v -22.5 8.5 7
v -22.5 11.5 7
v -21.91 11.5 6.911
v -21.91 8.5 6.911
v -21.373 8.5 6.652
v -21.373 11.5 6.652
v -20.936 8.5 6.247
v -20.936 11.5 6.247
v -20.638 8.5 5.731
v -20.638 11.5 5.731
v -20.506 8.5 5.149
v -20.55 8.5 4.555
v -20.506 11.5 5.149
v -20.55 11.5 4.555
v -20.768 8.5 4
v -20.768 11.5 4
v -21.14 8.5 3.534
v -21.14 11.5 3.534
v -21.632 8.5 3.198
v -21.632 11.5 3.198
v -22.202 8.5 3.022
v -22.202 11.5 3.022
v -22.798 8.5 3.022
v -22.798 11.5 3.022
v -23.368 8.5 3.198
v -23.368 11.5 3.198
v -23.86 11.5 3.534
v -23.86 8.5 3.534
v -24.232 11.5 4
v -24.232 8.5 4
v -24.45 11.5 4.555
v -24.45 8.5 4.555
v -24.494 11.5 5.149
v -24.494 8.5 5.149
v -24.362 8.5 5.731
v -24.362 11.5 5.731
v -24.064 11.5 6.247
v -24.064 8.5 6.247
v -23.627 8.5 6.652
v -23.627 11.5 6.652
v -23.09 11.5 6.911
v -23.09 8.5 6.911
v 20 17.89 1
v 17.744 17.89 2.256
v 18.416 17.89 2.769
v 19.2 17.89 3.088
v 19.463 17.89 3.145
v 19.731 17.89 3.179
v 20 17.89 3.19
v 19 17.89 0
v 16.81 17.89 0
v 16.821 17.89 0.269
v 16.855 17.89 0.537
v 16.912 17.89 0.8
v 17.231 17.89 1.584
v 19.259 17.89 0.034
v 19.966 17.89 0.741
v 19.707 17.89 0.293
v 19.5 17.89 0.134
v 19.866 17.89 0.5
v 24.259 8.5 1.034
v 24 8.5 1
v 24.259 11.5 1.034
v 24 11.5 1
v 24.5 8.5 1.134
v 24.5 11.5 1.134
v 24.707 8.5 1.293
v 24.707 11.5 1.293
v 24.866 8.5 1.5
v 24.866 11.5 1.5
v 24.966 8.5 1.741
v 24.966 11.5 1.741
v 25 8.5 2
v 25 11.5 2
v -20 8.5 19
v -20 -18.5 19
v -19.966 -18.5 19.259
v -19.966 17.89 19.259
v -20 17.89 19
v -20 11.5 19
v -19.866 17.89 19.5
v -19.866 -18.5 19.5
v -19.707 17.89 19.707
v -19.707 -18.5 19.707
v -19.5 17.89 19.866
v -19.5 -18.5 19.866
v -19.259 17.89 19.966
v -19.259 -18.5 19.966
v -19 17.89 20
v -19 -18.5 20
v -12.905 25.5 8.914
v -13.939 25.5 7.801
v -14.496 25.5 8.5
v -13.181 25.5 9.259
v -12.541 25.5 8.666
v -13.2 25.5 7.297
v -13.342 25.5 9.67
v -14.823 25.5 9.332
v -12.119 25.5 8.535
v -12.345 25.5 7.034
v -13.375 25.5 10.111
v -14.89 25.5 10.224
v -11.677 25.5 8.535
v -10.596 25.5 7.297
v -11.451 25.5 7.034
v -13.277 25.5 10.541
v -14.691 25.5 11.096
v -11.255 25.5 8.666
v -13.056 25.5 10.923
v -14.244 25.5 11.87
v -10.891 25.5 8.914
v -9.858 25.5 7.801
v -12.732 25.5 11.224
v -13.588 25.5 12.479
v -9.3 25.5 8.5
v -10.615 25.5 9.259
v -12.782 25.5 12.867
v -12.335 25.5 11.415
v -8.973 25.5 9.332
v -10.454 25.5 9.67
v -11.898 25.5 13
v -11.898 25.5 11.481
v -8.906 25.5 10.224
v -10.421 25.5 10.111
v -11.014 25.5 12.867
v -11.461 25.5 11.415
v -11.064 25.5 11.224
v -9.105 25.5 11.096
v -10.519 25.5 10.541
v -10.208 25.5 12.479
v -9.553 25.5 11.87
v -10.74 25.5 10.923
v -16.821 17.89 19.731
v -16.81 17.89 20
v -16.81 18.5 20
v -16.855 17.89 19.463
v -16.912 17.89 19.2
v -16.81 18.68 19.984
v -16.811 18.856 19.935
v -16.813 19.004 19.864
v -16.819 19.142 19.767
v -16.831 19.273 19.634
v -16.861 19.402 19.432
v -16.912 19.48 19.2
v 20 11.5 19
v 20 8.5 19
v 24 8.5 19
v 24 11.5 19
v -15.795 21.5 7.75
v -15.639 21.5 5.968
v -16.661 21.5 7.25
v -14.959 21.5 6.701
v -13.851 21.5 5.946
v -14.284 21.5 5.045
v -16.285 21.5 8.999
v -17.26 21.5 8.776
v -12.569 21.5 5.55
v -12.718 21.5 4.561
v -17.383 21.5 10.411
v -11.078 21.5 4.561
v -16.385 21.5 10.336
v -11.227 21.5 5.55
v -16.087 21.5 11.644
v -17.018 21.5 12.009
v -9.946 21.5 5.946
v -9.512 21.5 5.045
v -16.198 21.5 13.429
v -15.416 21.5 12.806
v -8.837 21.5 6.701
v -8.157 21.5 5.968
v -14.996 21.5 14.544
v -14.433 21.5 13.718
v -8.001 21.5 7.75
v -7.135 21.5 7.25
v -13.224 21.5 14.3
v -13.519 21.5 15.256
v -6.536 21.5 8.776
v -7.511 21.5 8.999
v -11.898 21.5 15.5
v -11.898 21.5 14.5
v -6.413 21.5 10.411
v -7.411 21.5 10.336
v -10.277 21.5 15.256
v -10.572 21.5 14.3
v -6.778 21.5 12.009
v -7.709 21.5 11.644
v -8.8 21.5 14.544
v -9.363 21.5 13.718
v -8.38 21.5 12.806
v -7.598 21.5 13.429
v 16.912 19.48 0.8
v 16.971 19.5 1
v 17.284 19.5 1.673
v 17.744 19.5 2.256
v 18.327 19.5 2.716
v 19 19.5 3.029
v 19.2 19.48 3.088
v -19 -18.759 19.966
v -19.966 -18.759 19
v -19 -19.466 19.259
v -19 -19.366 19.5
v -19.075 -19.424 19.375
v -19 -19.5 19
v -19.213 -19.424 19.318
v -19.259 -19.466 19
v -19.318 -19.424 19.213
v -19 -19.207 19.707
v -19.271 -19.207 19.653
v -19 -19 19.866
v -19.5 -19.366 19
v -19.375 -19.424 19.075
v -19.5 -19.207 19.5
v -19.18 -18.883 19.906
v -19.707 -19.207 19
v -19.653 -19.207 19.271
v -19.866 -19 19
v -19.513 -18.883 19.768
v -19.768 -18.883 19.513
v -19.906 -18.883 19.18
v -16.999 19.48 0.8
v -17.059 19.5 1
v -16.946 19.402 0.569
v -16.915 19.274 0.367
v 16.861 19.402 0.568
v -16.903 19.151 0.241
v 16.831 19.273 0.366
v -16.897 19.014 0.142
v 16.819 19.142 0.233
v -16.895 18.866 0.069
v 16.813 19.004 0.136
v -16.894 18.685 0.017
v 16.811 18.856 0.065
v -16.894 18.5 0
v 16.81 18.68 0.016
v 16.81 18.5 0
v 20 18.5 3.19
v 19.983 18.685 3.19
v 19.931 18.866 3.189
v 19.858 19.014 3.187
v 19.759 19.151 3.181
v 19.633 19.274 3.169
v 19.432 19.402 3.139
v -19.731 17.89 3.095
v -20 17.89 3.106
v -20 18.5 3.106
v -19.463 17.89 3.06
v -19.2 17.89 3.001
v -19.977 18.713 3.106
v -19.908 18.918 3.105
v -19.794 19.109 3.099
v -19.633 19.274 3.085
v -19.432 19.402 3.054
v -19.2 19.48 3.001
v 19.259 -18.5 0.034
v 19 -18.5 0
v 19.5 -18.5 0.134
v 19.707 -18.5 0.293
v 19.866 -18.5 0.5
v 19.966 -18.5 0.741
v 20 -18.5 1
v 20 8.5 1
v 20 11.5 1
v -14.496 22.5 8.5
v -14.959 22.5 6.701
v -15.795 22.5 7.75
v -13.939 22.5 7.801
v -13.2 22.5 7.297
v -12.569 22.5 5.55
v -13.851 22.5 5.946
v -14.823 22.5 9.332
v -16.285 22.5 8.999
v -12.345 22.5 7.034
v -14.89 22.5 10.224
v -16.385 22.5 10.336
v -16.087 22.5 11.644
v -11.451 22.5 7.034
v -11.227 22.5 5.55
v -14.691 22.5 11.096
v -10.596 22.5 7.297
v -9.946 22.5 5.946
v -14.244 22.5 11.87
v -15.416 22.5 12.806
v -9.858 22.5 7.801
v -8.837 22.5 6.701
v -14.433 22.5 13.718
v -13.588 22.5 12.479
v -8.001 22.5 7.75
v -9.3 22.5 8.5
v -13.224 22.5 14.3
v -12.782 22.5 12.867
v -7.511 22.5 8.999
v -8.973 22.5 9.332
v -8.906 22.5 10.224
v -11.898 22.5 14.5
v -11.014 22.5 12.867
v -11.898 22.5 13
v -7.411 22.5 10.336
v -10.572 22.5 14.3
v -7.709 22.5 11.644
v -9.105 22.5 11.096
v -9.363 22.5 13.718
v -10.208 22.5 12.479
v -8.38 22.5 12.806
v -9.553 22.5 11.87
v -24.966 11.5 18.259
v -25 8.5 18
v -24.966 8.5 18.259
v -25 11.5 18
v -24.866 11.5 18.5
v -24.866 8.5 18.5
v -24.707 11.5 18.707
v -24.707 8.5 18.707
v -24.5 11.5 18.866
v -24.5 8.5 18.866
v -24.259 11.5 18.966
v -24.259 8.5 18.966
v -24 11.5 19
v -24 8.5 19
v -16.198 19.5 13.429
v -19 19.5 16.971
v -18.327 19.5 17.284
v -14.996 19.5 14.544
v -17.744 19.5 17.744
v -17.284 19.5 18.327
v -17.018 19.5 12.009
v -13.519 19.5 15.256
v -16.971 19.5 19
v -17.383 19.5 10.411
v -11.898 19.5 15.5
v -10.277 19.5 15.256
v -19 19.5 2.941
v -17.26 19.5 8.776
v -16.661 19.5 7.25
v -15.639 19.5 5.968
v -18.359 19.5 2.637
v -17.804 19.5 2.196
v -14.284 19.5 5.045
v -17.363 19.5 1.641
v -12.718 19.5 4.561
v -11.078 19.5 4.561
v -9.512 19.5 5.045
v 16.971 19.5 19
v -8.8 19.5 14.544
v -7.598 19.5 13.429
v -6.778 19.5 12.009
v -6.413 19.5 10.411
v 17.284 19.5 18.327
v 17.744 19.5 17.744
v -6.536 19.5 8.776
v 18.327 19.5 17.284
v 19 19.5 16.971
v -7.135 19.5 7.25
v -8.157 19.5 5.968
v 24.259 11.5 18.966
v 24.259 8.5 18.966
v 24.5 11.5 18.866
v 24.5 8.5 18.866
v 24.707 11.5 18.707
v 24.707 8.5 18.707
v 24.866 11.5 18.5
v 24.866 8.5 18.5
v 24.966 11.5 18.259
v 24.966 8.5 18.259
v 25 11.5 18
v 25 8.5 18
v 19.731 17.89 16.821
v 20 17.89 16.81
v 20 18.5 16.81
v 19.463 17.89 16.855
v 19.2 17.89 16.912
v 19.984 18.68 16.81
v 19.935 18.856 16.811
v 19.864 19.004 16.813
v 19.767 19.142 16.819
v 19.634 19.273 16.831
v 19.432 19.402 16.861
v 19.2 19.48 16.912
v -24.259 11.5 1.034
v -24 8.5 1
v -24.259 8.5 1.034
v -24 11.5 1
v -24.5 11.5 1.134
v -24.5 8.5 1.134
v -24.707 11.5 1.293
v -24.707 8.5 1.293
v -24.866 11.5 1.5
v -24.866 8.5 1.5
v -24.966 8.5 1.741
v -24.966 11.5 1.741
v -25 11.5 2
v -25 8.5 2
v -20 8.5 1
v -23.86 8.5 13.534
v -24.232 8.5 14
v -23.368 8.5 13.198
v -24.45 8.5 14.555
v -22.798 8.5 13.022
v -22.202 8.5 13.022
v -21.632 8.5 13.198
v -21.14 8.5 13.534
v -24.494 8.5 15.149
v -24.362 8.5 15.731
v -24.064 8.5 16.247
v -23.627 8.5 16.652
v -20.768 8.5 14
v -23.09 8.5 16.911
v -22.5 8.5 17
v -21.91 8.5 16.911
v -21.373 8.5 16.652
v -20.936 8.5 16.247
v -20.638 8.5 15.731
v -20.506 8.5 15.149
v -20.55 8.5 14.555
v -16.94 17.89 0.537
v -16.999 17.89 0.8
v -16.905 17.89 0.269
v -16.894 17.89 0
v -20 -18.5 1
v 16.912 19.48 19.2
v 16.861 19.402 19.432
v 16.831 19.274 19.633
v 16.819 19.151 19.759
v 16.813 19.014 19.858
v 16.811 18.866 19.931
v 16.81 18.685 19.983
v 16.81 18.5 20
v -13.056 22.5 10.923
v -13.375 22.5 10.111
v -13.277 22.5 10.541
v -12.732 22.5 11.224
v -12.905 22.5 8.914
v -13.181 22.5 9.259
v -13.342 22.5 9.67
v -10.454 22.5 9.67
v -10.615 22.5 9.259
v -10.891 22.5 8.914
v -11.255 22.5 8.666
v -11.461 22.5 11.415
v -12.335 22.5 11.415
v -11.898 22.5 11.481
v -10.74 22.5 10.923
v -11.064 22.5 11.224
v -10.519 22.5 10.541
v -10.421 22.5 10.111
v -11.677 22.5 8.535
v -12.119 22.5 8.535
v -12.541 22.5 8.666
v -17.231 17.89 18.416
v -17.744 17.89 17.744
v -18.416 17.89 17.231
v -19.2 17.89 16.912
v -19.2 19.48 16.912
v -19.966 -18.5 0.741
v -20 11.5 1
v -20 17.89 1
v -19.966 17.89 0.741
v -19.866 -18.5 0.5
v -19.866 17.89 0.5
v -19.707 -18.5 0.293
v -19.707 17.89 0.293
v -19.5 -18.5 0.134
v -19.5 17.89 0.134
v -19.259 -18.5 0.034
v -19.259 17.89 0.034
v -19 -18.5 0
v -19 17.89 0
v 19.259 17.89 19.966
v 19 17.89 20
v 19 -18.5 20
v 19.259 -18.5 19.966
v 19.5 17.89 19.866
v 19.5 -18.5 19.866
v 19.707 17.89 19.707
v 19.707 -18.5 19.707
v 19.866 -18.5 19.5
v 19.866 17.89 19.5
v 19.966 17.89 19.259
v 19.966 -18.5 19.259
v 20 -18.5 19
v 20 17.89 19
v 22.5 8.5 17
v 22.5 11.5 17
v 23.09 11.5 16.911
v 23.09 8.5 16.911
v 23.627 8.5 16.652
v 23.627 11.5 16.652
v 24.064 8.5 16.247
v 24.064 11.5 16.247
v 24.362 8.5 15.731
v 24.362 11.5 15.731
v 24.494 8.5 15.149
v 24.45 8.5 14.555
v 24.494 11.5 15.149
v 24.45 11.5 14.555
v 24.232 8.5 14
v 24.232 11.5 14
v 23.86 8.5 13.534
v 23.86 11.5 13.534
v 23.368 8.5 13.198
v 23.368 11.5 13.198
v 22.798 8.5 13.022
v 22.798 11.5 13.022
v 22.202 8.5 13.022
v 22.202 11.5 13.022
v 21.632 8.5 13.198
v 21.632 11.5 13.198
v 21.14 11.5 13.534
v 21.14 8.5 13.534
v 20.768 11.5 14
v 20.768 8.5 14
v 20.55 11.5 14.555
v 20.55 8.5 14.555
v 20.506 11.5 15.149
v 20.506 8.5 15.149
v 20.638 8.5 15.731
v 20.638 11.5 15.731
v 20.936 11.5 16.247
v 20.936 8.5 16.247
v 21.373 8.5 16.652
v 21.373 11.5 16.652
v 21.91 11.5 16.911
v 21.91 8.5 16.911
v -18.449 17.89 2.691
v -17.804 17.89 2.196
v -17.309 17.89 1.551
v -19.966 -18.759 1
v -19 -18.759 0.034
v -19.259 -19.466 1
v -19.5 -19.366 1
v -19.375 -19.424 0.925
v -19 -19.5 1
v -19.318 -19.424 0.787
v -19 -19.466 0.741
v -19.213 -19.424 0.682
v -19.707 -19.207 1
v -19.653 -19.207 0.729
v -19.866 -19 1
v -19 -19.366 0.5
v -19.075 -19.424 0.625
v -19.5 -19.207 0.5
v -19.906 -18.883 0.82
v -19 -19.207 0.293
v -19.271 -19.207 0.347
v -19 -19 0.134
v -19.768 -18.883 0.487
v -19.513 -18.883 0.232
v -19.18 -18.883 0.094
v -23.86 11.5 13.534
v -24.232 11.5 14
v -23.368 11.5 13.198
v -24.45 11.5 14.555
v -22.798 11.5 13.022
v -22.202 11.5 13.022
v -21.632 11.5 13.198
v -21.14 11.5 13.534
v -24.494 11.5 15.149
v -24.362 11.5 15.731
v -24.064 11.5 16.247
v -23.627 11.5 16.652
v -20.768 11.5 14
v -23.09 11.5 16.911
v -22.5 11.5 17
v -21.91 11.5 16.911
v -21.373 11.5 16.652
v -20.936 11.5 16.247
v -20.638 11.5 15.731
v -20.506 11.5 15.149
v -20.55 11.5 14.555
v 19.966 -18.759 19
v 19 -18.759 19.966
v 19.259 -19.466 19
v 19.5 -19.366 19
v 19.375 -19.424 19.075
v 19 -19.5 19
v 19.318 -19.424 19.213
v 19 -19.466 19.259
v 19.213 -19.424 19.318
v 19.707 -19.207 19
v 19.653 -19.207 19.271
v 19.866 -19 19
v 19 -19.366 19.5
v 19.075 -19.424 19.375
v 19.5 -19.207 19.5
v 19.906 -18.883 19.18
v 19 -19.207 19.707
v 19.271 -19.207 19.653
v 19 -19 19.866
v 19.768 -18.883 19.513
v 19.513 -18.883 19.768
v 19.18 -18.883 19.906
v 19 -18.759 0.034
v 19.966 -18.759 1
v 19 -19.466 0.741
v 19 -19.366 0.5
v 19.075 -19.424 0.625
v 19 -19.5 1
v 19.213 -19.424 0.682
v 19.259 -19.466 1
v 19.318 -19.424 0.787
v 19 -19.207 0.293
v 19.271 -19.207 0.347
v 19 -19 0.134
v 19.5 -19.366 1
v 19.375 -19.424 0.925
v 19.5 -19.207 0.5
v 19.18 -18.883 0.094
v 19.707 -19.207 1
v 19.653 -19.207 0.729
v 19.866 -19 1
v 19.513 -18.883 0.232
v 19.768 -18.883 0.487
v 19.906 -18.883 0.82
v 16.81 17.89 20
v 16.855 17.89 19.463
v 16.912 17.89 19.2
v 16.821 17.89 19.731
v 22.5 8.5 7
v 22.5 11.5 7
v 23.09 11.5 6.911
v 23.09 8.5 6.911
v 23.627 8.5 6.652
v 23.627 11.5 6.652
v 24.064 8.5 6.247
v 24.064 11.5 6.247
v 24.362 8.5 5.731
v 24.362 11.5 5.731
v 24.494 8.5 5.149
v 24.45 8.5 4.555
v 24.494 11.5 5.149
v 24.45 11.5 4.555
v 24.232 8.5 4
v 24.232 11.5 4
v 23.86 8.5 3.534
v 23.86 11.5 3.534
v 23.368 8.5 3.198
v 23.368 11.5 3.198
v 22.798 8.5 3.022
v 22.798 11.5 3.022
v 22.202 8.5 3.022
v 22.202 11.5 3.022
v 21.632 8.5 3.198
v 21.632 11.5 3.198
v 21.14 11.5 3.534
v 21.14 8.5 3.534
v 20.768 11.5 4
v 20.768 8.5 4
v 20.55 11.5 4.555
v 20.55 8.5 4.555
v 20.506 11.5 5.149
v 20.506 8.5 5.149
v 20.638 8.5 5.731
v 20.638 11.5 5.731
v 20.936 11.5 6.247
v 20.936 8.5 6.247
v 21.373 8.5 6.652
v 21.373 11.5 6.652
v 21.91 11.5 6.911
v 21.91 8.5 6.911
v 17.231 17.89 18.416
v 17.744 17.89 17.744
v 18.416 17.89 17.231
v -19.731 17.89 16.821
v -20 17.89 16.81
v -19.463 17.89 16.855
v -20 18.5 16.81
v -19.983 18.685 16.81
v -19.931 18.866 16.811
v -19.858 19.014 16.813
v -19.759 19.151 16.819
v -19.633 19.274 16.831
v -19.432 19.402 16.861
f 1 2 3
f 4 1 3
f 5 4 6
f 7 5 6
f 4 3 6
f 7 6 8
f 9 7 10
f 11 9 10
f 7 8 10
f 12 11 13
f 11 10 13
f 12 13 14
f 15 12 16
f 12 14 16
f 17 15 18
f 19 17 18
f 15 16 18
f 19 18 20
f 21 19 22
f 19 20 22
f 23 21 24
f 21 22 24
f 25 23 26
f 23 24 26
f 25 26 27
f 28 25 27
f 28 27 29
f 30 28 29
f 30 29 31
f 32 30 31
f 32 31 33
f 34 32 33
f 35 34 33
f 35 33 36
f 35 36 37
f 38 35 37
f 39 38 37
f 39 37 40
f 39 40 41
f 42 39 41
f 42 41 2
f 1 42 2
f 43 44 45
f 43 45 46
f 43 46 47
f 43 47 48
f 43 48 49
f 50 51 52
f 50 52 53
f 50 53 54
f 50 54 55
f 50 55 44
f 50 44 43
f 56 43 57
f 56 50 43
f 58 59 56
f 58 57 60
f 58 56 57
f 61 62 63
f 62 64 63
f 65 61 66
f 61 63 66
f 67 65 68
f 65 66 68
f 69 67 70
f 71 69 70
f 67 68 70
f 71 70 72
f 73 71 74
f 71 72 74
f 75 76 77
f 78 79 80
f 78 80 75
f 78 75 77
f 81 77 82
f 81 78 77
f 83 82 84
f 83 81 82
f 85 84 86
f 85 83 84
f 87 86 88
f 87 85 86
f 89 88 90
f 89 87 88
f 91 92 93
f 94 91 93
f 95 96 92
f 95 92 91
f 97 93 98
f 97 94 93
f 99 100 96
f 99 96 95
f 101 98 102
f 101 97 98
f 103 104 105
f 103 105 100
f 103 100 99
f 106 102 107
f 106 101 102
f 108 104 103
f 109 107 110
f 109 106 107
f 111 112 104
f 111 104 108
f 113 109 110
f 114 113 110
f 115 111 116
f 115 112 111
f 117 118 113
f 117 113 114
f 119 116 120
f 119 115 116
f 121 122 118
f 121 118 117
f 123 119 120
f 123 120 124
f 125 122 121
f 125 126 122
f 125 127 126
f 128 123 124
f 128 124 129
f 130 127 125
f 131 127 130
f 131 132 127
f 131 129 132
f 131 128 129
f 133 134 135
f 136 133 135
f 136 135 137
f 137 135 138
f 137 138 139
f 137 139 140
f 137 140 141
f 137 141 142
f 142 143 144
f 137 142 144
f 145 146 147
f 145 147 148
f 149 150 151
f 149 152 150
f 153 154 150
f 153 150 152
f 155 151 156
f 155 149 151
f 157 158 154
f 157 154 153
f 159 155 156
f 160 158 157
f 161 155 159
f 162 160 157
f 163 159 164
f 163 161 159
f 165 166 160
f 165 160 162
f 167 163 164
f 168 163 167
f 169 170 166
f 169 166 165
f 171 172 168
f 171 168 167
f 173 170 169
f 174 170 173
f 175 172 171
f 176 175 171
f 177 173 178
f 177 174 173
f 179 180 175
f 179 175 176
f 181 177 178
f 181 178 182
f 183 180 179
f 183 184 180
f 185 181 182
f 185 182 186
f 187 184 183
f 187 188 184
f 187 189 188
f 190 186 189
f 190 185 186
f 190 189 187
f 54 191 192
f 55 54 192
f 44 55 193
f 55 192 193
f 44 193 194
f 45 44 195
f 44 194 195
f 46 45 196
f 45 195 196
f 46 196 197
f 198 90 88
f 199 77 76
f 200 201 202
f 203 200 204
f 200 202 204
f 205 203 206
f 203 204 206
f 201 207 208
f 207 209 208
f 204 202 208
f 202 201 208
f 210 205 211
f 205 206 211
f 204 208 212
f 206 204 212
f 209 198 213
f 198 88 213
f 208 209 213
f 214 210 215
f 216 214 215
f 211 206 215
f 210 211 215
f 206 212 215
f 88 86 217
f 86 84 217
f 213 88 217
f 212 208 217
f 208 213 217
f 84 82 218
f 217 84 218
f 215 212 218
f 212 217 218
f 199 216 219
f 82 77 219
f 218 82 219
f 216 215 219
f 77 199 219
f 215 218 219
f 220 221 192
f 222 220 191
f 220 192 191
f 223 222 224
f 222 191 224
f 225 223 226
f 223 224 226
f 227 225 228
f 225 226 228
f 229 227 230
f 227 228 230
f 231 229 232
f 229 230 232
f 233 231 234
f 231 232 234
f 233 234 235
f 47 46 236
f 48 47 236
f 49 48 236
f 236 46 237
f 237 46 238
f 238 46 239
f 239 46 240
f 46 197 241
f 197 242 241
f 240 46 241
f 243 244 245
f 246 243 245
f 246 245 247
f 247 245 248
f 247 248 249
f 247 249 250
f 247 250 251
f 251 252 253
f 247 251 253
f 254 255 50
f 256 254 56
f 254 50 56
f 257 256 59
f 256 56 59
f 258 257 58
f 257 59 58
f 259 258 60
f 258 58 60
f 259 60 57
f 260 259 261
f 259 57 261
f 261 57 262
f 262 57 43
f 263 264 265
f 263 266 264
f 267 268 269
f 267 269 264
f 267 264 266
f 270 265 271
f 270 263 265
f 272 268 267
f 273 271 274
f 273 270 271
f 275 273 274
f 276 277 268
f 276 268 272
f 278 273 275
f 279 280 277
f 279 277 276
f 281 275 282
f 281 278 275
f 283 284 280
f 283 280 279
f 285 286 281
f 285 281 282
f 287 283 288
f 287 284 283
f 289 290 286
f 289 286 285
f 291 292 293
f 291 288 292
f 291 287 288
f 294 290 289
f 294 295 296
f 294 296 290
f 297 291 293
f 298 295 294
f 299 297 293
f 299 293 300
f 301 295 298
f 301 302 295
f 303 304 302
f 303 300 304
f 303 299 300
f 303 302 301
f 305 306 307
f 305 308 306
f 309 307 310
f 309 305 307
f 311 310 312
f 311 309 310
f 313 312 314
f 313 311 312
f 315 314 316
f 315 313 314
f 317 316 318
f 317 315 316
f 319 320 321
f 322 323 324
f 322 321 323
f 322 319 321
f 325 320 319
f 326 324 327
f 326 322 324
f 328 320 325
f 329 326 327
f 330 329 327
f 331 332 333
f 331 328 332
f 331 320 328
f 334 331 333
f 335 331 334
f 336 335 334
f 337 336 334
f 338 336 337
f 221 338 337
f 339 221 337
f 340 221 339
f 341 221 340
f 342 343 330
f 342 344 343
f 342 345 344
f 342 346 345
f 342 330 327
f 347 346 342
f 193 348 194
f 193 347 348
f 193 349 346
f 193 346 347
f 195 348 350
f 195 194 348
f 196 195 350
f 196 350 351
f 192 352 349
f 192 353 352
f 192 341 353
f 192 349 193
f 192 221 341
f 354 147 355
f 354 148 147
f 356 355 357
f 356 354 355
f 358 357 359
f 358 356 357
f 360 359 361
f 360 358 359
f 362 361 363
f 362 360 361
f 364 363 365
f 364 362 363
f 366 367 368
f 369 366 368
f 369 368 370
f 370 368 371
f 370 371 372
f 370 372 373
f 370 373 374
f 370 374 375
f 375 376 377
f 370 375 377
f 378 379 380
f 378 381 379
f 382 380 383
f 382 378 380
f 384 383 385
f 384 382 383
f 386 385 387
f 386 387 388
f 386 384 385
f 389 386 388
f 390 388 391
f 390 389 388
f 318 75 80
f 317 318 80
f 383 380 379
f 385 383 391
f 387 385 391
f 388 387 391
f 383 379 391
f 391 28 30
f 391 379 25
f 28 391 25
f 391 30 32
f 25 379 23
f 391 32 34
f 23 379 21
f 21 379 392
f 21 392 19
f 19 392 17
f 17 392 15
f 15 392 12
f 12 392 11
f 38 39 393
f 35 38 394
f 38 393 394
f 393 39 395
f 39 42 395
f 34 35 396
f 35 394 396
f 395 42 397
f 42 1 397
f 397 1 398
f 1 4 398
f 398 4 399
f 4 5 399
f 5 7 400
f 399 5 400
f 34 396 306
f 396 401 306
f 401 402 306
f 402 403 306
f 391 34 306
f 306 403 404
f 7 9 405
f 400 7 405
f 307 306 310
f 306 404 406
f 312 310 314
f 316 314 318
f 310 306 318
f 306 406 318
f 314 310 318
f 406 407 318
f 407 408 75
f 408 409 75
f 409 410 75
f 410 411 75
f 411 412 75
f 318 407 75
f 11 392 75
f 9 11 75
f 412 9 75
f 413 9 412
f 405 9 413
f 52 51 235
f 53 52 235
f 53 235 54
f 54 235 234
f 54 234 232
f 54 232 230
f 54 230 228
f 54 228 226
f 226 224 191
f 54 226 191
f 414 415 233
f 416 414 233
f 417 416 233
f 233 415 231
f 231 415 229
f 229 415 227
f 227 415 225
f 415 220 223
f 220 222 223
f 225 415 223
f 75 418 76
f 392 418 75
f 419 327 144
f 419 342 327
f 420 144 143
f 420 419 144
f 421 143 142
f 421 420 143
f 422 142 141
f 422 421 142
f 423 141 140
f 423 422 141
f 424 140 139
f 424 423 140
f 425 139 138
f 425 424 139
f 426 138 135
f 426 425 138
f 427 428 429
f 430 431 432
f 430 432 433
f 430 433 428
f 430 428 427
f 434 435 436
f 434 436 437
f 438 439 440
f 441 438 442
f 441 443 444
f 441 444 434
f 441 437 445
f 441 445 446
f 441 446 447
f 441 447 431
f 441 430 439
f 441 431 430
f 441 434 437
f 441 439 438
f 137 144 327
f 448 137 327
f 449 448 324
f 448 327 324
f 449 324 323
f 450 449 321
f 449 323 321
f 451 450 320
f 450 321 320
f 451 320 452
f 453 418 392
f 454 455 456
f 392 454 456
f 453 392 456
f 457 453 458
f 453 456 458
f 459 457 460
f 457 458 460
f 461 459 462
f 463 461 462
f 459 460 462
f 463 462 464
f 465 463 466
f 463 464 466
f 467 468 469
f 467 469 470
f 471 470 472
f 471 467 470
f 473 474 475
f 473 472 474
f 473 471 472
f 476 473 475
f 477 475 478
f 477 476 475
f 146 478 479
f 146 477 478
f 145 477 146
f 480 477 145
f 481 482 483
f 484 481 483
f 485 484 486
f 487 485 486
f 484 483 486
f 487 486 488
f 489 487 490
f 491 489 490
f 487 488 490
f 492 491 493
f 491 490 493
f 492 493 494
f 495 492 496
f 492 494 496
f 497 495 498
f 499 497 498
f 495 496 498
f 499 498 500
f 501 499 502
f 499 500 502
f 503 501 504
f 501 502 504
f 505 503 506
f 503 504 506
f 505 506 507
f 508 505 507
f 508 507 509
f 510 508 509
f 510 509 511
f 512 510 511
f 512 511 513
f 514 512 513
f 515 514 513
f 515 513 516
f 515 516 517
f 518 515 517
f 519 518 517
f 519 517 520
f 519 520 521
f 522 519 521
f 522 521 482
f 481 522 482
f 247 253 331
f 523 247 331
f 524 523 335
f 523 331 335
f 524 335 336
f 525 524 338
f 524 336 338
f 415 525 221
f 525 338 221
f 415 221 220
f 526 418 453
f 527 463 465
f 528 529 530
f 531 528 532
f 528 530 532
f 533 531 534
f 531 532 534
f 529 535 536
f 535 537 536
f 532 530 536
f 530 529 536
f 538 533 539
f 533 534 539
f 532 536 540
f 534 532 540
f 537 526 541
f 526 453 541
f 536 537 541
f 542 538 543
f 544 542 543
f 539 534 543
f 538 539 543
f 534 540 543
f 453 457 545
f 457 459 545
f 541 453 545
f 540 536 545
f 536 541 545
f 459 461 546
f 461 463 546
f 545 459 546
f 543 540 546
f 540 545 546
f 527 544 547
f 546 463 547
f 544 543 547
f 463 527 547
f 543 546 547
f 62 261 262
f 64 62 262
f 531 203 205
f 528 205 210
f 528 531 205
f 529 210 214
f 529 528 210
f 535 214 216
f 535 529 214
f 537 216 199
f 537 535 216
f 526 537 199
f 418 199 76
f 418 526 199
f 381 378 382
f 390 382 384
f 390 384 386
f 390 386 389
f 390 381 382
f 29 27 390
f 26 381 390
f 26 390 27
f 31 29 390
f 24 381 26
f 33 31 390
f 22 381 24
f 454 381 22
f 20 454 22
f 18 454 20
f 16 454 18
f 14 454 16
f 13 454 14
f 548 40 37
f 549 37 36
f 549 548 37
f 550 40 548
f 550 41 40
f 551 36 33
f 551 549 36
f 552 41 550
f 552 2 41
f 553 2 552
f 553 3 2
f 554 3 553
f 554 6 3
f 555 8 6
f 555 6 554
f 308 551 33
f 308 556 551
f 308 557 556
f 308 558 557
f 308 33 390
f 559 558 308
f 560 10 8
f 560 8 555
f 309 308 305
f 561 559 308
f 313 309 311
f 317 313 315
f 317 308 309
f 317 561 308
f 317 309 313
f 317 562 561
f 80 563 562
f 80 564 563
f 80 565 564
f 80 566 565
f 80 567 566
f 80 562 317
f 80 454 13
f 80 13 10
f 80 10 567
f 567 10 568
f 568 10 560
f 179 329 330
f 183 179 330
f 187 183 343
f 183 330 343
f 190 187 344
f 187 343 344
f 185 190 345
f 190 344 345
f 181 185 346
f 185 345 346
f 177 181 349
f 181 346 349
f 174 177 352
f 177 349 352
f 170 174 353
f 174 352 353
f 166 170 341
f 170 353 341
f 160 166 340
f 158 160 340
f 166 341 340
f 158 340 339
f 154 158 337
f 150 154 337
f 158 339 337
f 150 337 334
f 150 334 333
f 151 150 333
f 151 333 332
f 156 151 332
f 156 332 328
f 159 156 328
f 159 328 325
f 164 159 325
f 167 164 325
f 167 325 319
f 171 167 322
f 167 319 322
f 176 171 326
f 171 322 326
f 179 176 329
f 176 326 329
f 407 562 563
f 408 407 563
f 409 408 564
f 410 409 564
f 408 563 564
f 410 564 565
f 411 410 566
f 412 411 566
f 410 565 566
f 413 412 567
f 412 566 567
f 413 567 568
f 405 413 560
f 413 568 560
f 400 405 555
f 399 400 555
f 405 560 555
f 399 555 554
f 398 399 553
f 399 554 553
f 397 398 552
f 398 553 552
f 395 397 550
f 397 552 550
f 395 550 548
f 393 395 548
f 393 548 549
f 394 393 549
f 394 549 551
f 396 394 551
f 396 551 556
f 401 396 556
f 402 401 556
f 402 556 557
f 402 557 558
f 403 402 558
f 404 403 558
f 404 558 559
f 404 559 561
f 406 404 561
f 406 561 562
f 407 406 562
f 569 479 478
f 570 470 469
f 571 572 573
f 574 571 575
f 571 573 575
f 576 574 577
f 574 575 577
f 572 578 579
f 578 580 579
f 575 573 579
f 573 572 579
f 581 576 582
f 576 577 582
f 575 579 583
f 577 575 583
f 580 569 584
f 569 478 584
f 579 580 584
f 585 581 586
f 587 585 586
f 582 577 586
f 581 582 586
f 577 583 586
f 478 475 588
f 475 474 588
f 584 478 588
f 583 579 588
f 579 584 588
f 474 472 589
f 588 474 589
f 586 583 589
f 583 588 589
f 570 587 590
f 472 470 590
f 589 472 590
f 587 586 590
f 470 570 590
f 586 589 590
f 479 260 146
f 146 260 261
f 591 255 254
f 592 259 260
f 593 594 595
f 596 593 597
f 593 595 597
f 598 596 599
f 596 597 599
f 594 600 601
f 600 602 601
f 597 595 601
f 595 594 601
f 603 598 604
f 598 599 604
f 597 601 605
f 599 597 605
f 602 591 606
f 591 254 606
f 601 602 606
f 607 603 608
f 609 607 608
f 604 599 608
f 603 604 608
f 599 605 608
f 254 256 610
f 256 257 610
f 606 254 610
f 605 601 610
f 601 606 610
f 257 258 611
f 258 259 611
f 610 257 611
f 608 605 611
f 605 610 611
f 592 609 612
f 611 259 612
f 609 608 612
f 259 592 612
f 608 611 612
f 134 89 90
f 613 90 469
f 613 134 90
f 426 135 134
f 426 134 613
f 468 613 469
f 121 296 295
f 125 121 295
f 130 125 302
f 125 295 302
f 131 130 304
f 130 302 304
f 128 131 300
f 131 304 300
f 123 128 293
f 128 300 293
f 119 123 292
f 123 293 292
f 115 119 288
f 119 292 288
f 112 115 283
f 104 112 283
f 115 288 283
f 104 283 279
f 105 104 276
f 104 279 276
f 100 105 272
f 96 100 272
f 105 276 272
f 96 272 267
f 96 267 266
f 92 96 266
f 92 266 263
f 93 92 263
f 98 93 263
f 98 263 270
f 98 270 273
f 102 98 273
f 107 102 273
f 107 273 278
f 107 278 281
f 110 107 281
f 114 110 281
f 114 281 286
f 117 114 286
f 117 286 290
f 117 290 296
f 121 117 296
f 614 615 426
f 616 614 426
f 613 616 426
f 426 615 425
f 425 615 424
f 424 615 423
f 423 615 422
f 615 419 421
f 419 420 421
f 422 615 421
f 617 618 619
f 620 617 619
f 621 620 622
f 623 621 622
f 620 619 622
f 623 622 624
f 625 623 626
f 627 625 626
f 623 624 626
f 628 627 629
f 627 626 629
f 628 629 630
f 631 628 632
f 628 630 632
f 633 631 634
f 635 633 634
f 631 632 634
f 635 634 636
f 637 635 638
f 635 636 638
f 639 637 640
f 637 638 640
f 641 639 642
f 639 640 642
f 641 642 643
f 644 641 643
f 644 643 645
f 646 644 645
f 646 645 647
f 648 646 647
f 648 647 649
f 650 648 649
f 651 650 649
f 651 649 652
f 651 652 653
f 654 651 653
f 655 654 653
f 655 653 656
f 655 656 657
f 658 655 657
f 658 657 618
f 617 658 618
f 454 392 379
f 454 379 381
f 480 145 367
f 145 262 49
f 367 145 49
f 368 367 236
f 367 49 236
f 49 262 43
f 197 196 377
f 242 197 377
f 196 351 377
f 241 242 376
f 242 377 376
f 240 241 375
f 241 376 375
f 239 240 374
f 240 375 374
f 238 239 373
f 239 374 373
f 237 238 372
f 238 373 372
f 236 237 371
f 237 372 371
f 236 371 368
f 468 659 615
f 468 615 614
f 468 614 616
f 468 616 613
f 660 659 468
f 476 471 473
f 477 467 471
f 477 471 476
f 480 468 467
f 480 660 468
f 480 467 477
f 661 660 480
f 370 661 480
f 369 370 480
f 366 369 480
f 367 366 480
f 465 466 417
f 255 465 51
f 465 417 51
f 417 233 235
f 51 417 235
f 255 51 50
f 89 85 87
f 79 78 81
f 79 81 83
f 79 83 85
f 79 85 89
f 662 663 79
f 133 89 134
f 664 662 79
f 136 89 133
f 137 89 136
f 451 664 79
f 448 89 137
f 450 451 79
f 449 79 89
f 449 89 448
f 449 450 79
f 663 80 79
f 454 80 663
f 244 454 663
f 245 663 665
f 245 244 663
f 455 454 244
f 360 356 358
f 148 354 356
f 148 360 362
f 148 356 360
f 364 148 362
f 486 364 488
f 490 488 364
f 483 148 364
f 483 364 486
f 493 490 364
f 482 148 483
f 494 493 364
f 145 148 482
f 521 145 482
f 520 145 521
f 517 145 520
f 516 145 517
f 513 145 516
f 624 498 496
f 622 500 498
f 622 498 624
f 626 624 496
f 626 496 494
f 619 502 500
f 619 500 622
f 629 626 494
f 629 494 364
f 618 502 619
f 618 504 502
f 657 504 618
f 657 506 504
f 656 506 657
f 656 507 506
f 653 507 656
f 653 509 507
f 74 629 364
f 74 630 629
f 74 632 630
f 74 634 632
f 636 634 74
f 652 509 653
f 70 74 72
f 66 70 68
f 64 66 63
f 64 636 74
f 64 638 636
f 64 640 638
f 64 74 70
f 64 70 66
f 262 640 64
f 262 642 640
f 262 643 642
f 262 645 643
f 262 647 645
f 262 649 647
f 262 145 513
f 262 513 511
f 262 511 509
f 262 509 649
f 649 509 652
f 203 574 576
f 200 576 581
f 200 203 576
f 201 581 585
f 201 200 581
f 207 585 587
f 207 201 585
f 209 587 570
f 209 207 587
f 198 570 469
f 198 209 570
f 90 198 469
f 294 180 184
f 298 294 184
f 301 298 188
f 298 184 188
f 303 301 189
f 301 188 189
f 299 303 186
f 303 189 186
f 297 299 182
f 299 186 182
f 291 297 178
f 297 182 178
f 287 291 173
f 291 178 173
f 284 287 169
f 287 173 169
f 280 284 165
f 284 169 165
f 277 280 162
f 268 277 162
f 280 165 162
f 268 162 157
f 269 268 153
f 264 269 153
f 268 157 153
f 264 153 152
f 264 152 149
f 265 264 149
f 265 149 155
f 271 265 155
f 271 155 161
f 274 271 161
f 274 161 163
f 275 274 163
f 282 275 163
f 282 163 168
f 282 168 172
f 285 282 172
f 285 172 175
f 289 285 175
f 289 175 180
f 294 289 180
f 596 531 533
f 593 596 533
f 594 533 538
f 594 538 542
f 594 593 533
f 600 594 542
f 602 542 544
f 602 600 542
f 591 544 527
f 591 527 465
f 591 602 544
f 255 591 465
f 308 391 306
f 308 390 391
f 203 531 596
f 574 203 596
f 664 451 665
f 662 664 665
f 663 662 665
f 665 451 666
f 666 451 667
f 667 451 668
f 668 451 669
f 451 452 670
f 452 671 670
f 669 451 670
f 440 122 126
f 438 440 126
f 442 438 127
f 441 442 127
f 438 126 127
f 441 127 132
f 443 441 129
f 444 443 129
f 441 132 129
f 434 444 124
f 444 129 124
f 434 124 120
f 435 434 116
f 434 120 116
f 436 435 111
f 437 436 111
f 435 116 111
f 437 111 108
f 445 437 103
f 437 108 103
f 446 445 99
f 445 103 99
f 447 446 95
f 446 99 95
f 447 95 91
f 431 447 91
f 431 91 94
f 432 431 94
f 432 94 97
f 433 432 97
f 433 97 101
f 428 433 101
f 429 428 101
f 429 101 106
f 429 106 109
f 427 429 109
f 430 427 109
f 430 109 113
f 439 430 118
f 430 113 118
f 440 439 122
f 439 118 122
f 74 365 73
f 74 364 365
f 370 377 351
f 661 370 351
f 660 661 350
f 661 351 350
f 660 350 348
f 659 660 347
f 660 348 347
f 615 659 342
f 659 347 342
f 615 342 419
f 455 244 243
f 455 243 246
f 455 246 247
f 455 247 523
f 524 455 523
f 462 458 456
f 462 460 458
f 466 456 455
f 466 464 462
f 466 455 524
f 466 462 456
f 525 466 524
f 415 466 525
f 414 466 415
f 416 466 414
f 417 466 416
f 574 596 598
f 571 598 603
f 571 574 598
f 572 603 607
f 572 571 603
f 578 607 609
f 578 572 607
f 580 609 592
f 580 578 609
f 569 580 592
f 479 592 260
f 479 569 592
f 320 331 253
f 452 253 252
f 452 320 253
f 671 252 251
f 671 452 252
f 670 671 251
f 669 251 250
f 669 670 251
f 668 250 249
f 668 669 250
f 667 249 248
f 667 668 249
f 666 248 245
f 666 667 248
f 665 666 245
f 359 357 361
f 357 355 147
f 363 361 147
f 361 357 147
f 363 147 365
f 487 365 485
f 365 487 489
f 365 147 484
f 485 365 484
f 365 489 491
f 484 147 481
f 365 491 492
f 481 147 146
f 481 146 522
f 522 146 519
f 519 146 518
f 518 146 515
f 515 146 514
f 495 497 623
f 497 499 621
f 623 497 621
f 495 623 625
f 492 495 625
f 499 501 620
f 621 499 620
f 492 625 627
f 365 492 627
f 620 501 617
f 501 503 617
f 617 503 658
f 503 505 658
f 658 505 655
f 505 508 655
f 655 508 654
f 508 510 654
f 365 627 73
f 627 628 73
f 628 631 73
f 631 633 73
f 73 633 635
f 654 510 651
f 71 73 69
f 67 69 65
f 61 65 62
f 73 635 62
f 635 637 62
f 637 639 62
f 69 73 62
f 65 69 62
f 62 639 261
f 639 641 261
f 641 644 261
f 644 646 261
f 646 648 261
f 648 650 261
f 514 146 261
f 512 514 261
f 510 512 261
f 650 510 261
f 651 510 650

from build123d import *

# Parameters (mm, degrees)
SKETCH_1_W           = 40
SKETCH_1_H           = 39
EXTRUDE_1_DEPTH      = 20
SKETCH_2_R           = 3
EXTRUDE_2_DEPTH      = 6
SKETCH_2_5_R         = 5.5
SKETCH_2_5_R_2       = 4.5
EXTRUDE_5_DEPTH      = 2
SKETCH_2_6_R         = 4.5
SKETCH_2_6_R_2       = 3
EXTRUDE_6_DEPTH      = 3
CUT_EXTRUDE_5_DEPTH  = 1.61
CUT_EXTRUDE_6_DEPTH  = 1.61
FILLET_2_R           = 1
FILLET_3_R           = 1
FILLET_5_R           = 1
FILLET_6_R           = 1
FILLET_9_R           = 1
SKETCH_6_R           = 1.481108103
CUT_EXTRUDE_11_DEPTH = 3
SKETCH_7_W           = 18
SKETCH_7_H           = 3
EXTRUDE_10_DEPTH     = 5
SKETCH_14_R          = 2
CUT_EXTRUDE_12_DEPTH = 45.564559955
SKETCH_12_W          = 18
SKETCH_12_H          = 3
EXTRUDE_11_DEPTH     = 5
SKETCH_15_R          = 2
CUT_EXTRUDE_13_DEPTH = 45.564559955
FILLET_10_R          = 1


with BuildPart() as part:
    # 草图1 → 凸台-拉伸1 (new body)
    with BuildSketch(Plane.XY):
        Rectangle(SKETCH_1_W, SKETCH_1_H)
    extrude(amount=EXTRUDE_1_DEPTH)

    # 草图2 → 凸台-拉伸2 (add)
    with BuildSketch(Plane(origin=(0, 19.5, 0), x_dir=(1, 0, 0), z_dir=(0, 1, 0))):
        with Locations((-11.898044795, -10)):
            Circle(SKETCH_2_R)
    extrude(amount=EXTRUDE_2_DEPTH)

    # 草图2<5> → 凸台-拉伸5 (add)
    with BuildSketch(Plane(origin=(0, 19.5, 0), x_dir=(1, 0, 0), z_dir=(0, 1, 0))):
        with Locations((-11.898044795, -10)):
            Circle(SKETCH_2_5_R)
        with Locations((-11.898044795, -10)):
            Circle(SKETCH_2_5_R_2, mode=Mode.SUBTRACT)
    extrude(amount=EXTRUDE_5_DEPTH)

    # 草图2<6> → 凸台-拉伸6 (add)
    with BuildSketch(Plane(origin=(0, 19.5, 0), x_dir=(1, 0, 0), z_dir=(0, 1, 0))):
        with Locations((-11.898044795, -10)):
            Circle(SKETCH_2_6_R)
        with Locations((-11.898044795, -10)):
            Circle(SKETCH_2_6_R_2, mode=Mode.SUBTRACT)
    extrude(amount=EXTRUDE_6_DEPTH)

    # 草图2<8> → 切除-拉伸5 (cut)
    with BuildSketch(Plane(origin=(0, 19.5, 0), x_dir=(1, 0, 0), z_dir=(0, 1, 0))):
        with BuildLine():
            Line((-16.893747566, 0), (-20, 0))
            Line((-20, 0), (-20, -3.106252434))
            ThreePointArc((-20, -3.106252434), (-17.80354784, -2.19645216), (-16.893747566, 0))
        make_face()
    extrude(amount=-CUT_EXTRUDE_5_DEPTH, mode=Mode.SUBTRACT)

    # 草图2<12> → 切除-拉伸6 (cut)
    with BuildSketch(Plane(origin=(0, 19.5, 0), x_dir=(1, 0, 0), z_dir=(0, 1, 0))):
        with BuildLine():
            ThreePointArc((16.81, 0), (17.744329368, -2.255670632), (20, -3.19))
            Line((20, -3.19), (20, 0))
            Line((20, 0), (16.81, 0))
        make_face()
        with BuildLine():
            Line((-20, -16.81), (-20, -20))
            Line((-20, -20), (-16.81, -20))
            ThreePointArc((-16.81, -20), (-17.744329368, -17.744329368), (-20, -16.81))
        make_face()
        with BuildLine():
            Line((16.81, -20), (20, -20))
            Line((20, -20), (20, -16.81))
            ThreePointArc((20, -16.81), (17.744329368, -17.744329368), (16.81, -20))
        make_face()
    extrude(amount=-CUT_EXTRUDE_6_DEPTH, mode=Mode.SUBTRACT)

    # 圆角2
    fillet_2_edges = [part.edges().sort_by_distance(p)[0] for p in [
        (-0.041873783, 19.5, 0),
    ]]
    fillet(fillet_2_edges, radius=FILLET_2_R)

    # 圆角3
    fillet_3_edges = [part.edges().sort_by_distance(p)[0] for p in [
        (20, 19.5, 10),
        (0, 19.5, 20),
        (-20, 19.5, 9.958126217),
    ]]
    fillet(fillet_3_edges, radius=FILLET_3_R)

    # 圆角5
    fillet_5_edges = [part.edges().sort_by_distance(p)[0] for p in [
        (-20, -0.805, 0),
    ]]
    fillet(fillet_5_edges, radius=FILLET_5_R)

    # 圆角6
    fillet_6_edges = [part.edges().sort_by_distance(p)[0] for p in [
        (20, -0.805, 0),
        (20, -0.805, 20),
        (-20, -0.805, 20),
    ]]
    fillet(fillet_6_edges, radius=FILLET_6_R)

    # 圆角9
    fillet_9_edges = [part.edges().sort_by_distance(p)[0] for p in [
        (-20, -19.5, 10),
        (0, -19.5, 0),
        (20, -19.5, 10),
        (0, -19.5, 20),
        (-19.707106781, -19.5, 19.707106781),
        (-19.707106781, -19.5, 0.292893219),
        (19.707106781, -19.5, 0.292893219),
        (19.707106781, -19.5, 19.707106781),
    ]]
    fillet(fillet_9_edges, radius=FILLET_9_R)

    # 草图6 → 切除-拉伸11 (cut)
    with BuildSketch(Plane(origin=(0, 25.5, 0), x_dir=(1, 0, 0), z_dir=(0, 1, 0))):
        with Locations((-11.898044795, -10)):
            Circle(SKETCH_6_R)
    extrude(amount=-CUT_EXTRUDE_11_DEPTH, mode=Mode.SUBTRACT)

    # 草图7 → 凸台-拉伸10 (add)
    with BuildSketch(Plane(origin=(20, 0, 0), x_dir=(0, 0, -1), z_dir=(1, 0, 0))):
        with Locations((-10, 10)):
            Rectangle(SKETCH_7_W, SKETCH_7_H)
    extrude(amount=EXTRUDE_10_DEPTH)

    # 草图14 → 切除-拉伸12 (cut, through all)
    with BuildSketch(Plane(origin=(0, 11.5, 0), x_dir=(1, 0, 0), z_dir=(0, 1, 0))):
        with Locations((22.5, -5)):
            Circle(SKETCH_14_R)
        with Locations((22.5, -15)):
            Circle(SKETCH_14_R)
    extrude(amount=-CUT_EXTRUDE_12_DEPTH, mode=Mode.SUBTRACT)

    # 草图12 → 凸台-拉伸11 (add)
    with BuildSketch(Plane.ZY.offset(20)):
        with Locations((10, 10)):
            Rectangle(SKETCH_12_W, SKETCH_12_H)
    extrude(amount=EXTRUDE_11_DEPTH)

    # 草图15 → 切除-拉伸13 (cut, through all)
    with BuildSketch(Plane(origin=(0, 11.5, 0), x_dir=(1, 0, 0), z_dir=(0, 1, 0))):
        with Locations((-22.5, -5)):
            Circle(SKETCH_15_R)
        with Locations((-22.5, -15)):
            Circle(SKETCH_15_R)
    extrude(amount=-CUT_EXTRUDE_13_DEPTH, mode=Mode.SUBTRACT)

    # 圆角10
    fillet_10_edges = [part.edges().sort_by_distance(p)[0] for p in [
        (-25, 10, 1),
        (-25, 10, 19),
        (25, 10, 19),
        (25, 10, 1),
    ]]
    fillet(fillet_10_edges, radius=FILLET_10_R)


solid = part.part
